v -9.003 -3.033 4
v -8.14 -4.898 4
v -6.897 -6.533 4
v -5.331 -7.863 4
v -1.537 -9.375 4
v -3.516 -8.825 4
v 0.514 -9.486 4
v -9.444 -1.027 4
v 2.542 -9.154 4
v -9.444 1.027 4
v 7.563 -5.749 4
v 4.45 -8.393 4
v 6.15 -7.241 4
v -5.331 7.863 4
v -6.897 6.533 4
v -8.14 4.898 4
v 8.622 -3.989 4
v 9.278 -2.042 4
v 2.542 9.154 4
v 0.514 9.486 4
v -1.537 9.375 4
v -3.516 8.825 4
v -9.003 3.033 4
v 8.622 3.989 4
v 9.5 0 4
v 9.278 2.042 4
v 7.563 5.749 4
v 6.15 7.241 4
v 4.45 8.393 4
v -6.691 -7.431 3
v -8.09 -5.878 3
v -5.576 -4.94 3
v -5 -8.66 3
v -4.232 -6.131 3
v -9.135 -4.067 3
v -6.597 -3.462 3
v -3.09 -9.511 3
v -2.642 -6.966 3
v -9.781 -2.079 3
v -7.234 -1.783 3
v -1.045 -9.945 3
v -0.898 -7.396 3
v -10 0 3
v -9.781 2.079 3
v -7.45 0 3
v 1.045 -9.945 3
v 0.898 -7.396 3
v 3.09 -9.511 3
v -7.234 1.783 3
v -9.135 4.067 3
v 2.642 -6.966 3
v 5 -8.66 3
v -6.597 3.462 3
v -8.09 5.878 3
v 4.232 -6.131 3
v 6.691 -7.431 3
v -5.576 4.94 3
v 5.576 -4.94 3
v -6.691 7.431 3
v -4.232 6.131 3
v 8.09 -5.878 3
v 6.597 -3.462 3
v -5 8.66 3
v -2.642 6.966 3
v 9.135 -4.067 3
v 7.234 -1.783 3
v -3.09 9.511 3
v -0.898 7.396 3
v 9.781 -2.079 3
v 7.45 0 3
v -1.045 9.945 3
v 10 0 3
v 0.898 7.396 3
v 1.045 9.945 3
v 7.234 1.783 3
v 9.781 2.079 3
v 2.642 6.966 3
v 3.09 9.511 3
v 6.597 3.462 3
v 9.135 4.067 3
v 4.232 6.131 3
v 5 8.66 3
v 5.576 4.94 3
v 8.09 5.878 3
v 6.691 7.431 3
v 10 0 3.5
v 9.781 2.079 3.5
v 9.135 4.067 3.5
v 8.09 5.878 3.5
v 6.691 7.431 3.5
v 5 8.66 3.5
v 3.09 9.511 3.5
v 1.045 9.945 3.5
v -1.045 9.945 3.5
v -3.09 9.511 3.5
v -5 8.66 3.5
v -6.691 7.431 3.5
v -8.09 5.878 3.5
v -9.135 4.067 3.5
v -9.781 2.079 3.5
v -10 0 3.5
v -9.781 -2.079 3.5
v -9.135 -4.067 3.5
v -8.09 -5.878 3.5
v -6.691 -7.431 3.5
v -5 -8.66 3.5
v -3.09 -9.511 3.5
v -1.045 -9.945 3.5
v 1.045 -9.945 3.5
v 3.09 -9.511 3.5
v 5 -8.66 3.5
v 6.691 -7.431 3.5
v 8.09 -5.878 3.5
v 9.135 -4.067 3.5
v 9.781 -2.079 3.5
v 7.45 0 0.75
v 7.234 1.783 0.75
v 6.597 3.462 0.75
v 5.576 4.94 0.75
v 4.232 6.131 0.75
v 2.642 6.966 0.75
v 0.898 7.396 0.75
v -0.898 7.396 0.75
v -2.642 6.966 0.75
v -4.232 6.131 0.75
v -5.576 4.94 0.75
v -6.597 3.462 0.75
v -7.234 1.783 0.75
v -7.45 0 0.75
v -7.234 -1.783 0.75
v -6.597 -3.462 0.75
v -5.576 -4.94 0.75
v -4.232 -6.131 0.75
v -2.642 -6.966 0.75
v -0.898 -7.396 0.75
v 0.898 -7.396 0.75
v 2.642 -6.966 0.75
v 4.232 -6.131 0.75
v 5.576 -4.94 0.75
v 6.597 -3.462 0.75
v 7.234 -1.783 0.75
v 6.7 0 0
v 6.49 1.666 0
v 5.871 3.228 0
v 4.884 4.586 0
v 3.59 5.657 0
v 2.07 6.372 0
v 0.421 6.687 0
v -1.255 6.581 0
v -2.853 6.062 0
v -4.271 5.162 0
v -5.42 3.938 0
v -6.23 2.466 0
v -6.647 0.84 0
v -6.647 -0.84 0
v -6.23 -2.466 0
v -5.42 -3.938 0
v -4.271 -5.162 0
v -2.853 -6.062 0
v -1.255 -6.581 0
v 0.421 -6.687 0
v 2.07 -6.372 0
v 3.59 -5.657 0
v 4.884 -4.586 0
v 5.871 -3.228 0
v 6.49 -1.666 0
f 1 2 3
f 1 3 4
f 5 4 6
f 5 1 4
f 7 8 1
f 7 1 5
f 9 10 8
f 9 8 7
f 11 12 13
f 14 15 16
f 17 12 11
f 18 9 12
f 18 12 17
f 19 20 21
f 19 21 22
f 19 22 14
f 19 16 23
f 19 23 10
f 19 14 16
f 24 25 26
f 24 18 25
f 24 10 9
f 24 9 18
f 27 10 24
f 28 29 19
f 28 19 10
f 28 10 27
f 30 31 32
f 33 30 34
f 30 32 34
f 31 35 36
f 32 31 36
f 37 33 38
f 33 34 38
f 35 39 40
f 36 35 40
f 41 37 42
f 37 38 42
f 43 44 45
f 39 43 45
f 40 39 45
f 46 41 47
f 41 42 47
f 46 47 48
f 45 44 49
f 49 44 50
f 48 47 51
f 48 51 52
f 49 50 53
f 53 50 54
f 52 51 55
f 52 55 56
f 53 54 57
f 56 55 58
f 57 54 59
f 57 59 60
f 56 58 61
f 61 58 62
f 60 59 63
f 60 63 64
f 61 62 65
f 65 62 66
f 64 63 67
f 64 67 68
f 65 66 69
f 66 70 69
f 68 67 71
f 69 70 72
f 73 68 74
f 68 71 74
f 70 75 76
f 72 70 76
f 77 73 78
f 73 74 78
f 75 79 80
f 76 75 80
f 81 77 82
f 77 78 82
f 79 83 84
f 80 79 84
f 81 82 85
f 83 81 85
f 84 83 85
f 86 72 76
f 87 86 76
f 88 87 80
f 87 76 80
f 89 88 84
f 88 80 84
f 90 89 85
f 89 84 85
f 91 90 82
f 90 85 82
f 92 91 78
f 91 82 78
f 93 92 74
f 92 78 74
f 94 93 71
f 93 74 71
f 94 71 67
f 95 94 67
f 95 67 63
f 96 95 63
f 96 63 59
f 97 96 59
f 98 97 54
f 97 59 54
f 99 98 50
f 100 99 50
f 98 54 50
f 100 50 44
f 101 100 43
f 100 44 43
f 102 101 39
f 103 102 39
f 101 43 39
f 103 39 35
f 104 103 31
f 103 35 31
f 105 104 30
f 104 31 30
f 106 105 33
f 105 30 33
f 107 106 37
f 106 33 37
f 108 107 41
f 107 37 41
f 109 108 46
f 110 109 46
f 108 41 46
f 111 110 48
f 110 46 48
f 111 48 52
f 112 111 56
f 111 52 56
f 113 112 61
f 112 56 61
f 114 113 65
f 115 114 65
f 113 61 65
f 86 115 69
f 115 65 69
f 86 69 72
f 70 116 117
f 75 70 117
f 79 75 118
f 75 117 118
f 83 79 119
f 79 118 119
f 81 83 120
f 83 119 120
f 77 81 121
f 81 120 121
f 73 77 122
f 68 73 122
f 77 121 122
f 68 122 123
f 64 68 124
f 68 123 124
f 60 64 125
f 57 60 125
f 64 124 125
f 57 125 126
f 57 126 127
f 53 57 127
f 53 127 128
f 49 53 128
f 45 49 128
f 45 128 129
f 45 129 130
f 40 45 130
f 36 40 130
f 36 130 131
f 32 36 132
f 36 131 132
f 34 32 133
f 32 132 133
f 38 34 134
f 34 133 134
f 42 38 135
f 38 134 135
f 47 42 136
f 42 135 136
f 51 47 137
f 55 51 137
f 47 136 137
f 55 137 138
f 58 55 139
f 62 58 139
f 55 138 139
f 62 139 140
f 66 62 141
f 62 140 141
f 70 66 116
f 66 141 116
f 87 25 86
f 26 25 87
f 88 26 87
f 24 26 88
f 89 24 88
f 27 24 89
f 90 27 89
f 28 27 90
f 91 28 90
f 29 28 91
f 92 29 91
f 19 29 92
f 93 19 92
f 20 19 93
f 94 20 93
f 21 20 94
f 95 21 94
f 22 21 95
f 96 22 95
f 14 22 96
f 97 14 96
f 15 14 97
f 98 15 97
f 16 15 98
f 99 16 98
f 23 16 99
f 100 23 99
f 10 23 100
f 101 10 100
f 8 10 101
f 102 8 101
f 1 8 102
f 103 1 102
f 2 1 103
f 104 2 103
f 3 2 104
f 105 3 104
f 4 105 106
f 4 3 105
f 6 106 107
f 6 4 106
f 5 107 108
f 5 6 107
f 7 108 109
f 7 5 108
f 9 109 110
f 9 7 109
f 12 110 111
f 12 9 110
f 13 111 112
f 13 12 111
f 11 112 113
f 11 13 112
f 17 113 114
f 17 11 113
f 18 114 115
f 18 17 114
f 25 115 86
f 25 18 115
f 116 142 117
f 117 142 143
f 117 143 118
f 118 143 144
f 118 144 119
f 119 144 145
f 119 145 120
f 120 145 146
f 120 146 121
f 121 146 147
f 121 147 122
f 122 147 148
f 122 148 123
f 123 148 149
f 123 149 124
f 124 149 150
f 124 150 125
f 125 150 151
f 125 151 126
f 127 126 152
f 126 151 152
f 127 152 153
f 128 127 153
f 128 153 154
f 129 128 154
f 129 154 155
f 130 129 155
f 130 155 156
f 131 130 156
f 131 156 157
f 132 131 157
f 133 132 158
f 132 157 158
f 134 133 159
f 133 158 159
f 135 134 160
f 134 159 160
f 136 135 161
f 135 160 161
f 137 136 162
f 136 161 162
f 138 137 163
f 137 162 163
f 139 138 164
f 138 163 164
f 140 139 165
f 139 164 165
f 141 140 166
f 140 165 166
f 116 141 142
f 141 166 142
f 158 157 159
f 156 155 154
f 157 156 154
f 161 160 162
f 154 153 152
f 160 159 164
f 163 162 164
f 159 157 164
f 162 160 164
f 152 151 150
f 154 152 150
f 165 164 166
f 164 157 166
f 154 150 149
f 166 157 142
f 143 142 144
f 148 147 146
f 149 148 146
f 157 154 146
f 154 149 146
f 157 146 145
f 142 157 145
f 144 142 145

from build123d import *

# Parameters (mm, degrees)
F0_R     = 7.45
F1_DEPTH = 3
F2_R     = 10
F2_R_2   = 7.45
F3_DEPTH = 1
F4_SIZE  = 0.75
F5_SIZE  = 0.5


with BuildPart() as f1:
    # F0 (on Top) → F1 (new body)
    with BuildSketch(Plane.XY):
        Circle(F0_R)
    extrude(amount=F1_DEPTH)

    # F2 (on face) → F3 (join)
    with BuildSketch(Plane.XY.offset(3)):
        Circle(F2_R)
        Circle(F2_R_2, mode=Mode.SUBTRACT)
        Circle(F2_R_2)
    extrude(amount=F3_DEPTH)

    # F4
    f4_edges = [f1.edges().sort_by_distance(p)[0] for p in [
        (-7.45, 0, 0),
    ]]
    chamfer(f4_edges, length=F4_SIZE)

    # F5
    f5_edges = [f1.edges().sort_by_distance(p)[0] for p in [
        (-10, 0, 4),
    ]]
    chamfer(f5_edges, length=F5_SIZE)


solid = f1.part
